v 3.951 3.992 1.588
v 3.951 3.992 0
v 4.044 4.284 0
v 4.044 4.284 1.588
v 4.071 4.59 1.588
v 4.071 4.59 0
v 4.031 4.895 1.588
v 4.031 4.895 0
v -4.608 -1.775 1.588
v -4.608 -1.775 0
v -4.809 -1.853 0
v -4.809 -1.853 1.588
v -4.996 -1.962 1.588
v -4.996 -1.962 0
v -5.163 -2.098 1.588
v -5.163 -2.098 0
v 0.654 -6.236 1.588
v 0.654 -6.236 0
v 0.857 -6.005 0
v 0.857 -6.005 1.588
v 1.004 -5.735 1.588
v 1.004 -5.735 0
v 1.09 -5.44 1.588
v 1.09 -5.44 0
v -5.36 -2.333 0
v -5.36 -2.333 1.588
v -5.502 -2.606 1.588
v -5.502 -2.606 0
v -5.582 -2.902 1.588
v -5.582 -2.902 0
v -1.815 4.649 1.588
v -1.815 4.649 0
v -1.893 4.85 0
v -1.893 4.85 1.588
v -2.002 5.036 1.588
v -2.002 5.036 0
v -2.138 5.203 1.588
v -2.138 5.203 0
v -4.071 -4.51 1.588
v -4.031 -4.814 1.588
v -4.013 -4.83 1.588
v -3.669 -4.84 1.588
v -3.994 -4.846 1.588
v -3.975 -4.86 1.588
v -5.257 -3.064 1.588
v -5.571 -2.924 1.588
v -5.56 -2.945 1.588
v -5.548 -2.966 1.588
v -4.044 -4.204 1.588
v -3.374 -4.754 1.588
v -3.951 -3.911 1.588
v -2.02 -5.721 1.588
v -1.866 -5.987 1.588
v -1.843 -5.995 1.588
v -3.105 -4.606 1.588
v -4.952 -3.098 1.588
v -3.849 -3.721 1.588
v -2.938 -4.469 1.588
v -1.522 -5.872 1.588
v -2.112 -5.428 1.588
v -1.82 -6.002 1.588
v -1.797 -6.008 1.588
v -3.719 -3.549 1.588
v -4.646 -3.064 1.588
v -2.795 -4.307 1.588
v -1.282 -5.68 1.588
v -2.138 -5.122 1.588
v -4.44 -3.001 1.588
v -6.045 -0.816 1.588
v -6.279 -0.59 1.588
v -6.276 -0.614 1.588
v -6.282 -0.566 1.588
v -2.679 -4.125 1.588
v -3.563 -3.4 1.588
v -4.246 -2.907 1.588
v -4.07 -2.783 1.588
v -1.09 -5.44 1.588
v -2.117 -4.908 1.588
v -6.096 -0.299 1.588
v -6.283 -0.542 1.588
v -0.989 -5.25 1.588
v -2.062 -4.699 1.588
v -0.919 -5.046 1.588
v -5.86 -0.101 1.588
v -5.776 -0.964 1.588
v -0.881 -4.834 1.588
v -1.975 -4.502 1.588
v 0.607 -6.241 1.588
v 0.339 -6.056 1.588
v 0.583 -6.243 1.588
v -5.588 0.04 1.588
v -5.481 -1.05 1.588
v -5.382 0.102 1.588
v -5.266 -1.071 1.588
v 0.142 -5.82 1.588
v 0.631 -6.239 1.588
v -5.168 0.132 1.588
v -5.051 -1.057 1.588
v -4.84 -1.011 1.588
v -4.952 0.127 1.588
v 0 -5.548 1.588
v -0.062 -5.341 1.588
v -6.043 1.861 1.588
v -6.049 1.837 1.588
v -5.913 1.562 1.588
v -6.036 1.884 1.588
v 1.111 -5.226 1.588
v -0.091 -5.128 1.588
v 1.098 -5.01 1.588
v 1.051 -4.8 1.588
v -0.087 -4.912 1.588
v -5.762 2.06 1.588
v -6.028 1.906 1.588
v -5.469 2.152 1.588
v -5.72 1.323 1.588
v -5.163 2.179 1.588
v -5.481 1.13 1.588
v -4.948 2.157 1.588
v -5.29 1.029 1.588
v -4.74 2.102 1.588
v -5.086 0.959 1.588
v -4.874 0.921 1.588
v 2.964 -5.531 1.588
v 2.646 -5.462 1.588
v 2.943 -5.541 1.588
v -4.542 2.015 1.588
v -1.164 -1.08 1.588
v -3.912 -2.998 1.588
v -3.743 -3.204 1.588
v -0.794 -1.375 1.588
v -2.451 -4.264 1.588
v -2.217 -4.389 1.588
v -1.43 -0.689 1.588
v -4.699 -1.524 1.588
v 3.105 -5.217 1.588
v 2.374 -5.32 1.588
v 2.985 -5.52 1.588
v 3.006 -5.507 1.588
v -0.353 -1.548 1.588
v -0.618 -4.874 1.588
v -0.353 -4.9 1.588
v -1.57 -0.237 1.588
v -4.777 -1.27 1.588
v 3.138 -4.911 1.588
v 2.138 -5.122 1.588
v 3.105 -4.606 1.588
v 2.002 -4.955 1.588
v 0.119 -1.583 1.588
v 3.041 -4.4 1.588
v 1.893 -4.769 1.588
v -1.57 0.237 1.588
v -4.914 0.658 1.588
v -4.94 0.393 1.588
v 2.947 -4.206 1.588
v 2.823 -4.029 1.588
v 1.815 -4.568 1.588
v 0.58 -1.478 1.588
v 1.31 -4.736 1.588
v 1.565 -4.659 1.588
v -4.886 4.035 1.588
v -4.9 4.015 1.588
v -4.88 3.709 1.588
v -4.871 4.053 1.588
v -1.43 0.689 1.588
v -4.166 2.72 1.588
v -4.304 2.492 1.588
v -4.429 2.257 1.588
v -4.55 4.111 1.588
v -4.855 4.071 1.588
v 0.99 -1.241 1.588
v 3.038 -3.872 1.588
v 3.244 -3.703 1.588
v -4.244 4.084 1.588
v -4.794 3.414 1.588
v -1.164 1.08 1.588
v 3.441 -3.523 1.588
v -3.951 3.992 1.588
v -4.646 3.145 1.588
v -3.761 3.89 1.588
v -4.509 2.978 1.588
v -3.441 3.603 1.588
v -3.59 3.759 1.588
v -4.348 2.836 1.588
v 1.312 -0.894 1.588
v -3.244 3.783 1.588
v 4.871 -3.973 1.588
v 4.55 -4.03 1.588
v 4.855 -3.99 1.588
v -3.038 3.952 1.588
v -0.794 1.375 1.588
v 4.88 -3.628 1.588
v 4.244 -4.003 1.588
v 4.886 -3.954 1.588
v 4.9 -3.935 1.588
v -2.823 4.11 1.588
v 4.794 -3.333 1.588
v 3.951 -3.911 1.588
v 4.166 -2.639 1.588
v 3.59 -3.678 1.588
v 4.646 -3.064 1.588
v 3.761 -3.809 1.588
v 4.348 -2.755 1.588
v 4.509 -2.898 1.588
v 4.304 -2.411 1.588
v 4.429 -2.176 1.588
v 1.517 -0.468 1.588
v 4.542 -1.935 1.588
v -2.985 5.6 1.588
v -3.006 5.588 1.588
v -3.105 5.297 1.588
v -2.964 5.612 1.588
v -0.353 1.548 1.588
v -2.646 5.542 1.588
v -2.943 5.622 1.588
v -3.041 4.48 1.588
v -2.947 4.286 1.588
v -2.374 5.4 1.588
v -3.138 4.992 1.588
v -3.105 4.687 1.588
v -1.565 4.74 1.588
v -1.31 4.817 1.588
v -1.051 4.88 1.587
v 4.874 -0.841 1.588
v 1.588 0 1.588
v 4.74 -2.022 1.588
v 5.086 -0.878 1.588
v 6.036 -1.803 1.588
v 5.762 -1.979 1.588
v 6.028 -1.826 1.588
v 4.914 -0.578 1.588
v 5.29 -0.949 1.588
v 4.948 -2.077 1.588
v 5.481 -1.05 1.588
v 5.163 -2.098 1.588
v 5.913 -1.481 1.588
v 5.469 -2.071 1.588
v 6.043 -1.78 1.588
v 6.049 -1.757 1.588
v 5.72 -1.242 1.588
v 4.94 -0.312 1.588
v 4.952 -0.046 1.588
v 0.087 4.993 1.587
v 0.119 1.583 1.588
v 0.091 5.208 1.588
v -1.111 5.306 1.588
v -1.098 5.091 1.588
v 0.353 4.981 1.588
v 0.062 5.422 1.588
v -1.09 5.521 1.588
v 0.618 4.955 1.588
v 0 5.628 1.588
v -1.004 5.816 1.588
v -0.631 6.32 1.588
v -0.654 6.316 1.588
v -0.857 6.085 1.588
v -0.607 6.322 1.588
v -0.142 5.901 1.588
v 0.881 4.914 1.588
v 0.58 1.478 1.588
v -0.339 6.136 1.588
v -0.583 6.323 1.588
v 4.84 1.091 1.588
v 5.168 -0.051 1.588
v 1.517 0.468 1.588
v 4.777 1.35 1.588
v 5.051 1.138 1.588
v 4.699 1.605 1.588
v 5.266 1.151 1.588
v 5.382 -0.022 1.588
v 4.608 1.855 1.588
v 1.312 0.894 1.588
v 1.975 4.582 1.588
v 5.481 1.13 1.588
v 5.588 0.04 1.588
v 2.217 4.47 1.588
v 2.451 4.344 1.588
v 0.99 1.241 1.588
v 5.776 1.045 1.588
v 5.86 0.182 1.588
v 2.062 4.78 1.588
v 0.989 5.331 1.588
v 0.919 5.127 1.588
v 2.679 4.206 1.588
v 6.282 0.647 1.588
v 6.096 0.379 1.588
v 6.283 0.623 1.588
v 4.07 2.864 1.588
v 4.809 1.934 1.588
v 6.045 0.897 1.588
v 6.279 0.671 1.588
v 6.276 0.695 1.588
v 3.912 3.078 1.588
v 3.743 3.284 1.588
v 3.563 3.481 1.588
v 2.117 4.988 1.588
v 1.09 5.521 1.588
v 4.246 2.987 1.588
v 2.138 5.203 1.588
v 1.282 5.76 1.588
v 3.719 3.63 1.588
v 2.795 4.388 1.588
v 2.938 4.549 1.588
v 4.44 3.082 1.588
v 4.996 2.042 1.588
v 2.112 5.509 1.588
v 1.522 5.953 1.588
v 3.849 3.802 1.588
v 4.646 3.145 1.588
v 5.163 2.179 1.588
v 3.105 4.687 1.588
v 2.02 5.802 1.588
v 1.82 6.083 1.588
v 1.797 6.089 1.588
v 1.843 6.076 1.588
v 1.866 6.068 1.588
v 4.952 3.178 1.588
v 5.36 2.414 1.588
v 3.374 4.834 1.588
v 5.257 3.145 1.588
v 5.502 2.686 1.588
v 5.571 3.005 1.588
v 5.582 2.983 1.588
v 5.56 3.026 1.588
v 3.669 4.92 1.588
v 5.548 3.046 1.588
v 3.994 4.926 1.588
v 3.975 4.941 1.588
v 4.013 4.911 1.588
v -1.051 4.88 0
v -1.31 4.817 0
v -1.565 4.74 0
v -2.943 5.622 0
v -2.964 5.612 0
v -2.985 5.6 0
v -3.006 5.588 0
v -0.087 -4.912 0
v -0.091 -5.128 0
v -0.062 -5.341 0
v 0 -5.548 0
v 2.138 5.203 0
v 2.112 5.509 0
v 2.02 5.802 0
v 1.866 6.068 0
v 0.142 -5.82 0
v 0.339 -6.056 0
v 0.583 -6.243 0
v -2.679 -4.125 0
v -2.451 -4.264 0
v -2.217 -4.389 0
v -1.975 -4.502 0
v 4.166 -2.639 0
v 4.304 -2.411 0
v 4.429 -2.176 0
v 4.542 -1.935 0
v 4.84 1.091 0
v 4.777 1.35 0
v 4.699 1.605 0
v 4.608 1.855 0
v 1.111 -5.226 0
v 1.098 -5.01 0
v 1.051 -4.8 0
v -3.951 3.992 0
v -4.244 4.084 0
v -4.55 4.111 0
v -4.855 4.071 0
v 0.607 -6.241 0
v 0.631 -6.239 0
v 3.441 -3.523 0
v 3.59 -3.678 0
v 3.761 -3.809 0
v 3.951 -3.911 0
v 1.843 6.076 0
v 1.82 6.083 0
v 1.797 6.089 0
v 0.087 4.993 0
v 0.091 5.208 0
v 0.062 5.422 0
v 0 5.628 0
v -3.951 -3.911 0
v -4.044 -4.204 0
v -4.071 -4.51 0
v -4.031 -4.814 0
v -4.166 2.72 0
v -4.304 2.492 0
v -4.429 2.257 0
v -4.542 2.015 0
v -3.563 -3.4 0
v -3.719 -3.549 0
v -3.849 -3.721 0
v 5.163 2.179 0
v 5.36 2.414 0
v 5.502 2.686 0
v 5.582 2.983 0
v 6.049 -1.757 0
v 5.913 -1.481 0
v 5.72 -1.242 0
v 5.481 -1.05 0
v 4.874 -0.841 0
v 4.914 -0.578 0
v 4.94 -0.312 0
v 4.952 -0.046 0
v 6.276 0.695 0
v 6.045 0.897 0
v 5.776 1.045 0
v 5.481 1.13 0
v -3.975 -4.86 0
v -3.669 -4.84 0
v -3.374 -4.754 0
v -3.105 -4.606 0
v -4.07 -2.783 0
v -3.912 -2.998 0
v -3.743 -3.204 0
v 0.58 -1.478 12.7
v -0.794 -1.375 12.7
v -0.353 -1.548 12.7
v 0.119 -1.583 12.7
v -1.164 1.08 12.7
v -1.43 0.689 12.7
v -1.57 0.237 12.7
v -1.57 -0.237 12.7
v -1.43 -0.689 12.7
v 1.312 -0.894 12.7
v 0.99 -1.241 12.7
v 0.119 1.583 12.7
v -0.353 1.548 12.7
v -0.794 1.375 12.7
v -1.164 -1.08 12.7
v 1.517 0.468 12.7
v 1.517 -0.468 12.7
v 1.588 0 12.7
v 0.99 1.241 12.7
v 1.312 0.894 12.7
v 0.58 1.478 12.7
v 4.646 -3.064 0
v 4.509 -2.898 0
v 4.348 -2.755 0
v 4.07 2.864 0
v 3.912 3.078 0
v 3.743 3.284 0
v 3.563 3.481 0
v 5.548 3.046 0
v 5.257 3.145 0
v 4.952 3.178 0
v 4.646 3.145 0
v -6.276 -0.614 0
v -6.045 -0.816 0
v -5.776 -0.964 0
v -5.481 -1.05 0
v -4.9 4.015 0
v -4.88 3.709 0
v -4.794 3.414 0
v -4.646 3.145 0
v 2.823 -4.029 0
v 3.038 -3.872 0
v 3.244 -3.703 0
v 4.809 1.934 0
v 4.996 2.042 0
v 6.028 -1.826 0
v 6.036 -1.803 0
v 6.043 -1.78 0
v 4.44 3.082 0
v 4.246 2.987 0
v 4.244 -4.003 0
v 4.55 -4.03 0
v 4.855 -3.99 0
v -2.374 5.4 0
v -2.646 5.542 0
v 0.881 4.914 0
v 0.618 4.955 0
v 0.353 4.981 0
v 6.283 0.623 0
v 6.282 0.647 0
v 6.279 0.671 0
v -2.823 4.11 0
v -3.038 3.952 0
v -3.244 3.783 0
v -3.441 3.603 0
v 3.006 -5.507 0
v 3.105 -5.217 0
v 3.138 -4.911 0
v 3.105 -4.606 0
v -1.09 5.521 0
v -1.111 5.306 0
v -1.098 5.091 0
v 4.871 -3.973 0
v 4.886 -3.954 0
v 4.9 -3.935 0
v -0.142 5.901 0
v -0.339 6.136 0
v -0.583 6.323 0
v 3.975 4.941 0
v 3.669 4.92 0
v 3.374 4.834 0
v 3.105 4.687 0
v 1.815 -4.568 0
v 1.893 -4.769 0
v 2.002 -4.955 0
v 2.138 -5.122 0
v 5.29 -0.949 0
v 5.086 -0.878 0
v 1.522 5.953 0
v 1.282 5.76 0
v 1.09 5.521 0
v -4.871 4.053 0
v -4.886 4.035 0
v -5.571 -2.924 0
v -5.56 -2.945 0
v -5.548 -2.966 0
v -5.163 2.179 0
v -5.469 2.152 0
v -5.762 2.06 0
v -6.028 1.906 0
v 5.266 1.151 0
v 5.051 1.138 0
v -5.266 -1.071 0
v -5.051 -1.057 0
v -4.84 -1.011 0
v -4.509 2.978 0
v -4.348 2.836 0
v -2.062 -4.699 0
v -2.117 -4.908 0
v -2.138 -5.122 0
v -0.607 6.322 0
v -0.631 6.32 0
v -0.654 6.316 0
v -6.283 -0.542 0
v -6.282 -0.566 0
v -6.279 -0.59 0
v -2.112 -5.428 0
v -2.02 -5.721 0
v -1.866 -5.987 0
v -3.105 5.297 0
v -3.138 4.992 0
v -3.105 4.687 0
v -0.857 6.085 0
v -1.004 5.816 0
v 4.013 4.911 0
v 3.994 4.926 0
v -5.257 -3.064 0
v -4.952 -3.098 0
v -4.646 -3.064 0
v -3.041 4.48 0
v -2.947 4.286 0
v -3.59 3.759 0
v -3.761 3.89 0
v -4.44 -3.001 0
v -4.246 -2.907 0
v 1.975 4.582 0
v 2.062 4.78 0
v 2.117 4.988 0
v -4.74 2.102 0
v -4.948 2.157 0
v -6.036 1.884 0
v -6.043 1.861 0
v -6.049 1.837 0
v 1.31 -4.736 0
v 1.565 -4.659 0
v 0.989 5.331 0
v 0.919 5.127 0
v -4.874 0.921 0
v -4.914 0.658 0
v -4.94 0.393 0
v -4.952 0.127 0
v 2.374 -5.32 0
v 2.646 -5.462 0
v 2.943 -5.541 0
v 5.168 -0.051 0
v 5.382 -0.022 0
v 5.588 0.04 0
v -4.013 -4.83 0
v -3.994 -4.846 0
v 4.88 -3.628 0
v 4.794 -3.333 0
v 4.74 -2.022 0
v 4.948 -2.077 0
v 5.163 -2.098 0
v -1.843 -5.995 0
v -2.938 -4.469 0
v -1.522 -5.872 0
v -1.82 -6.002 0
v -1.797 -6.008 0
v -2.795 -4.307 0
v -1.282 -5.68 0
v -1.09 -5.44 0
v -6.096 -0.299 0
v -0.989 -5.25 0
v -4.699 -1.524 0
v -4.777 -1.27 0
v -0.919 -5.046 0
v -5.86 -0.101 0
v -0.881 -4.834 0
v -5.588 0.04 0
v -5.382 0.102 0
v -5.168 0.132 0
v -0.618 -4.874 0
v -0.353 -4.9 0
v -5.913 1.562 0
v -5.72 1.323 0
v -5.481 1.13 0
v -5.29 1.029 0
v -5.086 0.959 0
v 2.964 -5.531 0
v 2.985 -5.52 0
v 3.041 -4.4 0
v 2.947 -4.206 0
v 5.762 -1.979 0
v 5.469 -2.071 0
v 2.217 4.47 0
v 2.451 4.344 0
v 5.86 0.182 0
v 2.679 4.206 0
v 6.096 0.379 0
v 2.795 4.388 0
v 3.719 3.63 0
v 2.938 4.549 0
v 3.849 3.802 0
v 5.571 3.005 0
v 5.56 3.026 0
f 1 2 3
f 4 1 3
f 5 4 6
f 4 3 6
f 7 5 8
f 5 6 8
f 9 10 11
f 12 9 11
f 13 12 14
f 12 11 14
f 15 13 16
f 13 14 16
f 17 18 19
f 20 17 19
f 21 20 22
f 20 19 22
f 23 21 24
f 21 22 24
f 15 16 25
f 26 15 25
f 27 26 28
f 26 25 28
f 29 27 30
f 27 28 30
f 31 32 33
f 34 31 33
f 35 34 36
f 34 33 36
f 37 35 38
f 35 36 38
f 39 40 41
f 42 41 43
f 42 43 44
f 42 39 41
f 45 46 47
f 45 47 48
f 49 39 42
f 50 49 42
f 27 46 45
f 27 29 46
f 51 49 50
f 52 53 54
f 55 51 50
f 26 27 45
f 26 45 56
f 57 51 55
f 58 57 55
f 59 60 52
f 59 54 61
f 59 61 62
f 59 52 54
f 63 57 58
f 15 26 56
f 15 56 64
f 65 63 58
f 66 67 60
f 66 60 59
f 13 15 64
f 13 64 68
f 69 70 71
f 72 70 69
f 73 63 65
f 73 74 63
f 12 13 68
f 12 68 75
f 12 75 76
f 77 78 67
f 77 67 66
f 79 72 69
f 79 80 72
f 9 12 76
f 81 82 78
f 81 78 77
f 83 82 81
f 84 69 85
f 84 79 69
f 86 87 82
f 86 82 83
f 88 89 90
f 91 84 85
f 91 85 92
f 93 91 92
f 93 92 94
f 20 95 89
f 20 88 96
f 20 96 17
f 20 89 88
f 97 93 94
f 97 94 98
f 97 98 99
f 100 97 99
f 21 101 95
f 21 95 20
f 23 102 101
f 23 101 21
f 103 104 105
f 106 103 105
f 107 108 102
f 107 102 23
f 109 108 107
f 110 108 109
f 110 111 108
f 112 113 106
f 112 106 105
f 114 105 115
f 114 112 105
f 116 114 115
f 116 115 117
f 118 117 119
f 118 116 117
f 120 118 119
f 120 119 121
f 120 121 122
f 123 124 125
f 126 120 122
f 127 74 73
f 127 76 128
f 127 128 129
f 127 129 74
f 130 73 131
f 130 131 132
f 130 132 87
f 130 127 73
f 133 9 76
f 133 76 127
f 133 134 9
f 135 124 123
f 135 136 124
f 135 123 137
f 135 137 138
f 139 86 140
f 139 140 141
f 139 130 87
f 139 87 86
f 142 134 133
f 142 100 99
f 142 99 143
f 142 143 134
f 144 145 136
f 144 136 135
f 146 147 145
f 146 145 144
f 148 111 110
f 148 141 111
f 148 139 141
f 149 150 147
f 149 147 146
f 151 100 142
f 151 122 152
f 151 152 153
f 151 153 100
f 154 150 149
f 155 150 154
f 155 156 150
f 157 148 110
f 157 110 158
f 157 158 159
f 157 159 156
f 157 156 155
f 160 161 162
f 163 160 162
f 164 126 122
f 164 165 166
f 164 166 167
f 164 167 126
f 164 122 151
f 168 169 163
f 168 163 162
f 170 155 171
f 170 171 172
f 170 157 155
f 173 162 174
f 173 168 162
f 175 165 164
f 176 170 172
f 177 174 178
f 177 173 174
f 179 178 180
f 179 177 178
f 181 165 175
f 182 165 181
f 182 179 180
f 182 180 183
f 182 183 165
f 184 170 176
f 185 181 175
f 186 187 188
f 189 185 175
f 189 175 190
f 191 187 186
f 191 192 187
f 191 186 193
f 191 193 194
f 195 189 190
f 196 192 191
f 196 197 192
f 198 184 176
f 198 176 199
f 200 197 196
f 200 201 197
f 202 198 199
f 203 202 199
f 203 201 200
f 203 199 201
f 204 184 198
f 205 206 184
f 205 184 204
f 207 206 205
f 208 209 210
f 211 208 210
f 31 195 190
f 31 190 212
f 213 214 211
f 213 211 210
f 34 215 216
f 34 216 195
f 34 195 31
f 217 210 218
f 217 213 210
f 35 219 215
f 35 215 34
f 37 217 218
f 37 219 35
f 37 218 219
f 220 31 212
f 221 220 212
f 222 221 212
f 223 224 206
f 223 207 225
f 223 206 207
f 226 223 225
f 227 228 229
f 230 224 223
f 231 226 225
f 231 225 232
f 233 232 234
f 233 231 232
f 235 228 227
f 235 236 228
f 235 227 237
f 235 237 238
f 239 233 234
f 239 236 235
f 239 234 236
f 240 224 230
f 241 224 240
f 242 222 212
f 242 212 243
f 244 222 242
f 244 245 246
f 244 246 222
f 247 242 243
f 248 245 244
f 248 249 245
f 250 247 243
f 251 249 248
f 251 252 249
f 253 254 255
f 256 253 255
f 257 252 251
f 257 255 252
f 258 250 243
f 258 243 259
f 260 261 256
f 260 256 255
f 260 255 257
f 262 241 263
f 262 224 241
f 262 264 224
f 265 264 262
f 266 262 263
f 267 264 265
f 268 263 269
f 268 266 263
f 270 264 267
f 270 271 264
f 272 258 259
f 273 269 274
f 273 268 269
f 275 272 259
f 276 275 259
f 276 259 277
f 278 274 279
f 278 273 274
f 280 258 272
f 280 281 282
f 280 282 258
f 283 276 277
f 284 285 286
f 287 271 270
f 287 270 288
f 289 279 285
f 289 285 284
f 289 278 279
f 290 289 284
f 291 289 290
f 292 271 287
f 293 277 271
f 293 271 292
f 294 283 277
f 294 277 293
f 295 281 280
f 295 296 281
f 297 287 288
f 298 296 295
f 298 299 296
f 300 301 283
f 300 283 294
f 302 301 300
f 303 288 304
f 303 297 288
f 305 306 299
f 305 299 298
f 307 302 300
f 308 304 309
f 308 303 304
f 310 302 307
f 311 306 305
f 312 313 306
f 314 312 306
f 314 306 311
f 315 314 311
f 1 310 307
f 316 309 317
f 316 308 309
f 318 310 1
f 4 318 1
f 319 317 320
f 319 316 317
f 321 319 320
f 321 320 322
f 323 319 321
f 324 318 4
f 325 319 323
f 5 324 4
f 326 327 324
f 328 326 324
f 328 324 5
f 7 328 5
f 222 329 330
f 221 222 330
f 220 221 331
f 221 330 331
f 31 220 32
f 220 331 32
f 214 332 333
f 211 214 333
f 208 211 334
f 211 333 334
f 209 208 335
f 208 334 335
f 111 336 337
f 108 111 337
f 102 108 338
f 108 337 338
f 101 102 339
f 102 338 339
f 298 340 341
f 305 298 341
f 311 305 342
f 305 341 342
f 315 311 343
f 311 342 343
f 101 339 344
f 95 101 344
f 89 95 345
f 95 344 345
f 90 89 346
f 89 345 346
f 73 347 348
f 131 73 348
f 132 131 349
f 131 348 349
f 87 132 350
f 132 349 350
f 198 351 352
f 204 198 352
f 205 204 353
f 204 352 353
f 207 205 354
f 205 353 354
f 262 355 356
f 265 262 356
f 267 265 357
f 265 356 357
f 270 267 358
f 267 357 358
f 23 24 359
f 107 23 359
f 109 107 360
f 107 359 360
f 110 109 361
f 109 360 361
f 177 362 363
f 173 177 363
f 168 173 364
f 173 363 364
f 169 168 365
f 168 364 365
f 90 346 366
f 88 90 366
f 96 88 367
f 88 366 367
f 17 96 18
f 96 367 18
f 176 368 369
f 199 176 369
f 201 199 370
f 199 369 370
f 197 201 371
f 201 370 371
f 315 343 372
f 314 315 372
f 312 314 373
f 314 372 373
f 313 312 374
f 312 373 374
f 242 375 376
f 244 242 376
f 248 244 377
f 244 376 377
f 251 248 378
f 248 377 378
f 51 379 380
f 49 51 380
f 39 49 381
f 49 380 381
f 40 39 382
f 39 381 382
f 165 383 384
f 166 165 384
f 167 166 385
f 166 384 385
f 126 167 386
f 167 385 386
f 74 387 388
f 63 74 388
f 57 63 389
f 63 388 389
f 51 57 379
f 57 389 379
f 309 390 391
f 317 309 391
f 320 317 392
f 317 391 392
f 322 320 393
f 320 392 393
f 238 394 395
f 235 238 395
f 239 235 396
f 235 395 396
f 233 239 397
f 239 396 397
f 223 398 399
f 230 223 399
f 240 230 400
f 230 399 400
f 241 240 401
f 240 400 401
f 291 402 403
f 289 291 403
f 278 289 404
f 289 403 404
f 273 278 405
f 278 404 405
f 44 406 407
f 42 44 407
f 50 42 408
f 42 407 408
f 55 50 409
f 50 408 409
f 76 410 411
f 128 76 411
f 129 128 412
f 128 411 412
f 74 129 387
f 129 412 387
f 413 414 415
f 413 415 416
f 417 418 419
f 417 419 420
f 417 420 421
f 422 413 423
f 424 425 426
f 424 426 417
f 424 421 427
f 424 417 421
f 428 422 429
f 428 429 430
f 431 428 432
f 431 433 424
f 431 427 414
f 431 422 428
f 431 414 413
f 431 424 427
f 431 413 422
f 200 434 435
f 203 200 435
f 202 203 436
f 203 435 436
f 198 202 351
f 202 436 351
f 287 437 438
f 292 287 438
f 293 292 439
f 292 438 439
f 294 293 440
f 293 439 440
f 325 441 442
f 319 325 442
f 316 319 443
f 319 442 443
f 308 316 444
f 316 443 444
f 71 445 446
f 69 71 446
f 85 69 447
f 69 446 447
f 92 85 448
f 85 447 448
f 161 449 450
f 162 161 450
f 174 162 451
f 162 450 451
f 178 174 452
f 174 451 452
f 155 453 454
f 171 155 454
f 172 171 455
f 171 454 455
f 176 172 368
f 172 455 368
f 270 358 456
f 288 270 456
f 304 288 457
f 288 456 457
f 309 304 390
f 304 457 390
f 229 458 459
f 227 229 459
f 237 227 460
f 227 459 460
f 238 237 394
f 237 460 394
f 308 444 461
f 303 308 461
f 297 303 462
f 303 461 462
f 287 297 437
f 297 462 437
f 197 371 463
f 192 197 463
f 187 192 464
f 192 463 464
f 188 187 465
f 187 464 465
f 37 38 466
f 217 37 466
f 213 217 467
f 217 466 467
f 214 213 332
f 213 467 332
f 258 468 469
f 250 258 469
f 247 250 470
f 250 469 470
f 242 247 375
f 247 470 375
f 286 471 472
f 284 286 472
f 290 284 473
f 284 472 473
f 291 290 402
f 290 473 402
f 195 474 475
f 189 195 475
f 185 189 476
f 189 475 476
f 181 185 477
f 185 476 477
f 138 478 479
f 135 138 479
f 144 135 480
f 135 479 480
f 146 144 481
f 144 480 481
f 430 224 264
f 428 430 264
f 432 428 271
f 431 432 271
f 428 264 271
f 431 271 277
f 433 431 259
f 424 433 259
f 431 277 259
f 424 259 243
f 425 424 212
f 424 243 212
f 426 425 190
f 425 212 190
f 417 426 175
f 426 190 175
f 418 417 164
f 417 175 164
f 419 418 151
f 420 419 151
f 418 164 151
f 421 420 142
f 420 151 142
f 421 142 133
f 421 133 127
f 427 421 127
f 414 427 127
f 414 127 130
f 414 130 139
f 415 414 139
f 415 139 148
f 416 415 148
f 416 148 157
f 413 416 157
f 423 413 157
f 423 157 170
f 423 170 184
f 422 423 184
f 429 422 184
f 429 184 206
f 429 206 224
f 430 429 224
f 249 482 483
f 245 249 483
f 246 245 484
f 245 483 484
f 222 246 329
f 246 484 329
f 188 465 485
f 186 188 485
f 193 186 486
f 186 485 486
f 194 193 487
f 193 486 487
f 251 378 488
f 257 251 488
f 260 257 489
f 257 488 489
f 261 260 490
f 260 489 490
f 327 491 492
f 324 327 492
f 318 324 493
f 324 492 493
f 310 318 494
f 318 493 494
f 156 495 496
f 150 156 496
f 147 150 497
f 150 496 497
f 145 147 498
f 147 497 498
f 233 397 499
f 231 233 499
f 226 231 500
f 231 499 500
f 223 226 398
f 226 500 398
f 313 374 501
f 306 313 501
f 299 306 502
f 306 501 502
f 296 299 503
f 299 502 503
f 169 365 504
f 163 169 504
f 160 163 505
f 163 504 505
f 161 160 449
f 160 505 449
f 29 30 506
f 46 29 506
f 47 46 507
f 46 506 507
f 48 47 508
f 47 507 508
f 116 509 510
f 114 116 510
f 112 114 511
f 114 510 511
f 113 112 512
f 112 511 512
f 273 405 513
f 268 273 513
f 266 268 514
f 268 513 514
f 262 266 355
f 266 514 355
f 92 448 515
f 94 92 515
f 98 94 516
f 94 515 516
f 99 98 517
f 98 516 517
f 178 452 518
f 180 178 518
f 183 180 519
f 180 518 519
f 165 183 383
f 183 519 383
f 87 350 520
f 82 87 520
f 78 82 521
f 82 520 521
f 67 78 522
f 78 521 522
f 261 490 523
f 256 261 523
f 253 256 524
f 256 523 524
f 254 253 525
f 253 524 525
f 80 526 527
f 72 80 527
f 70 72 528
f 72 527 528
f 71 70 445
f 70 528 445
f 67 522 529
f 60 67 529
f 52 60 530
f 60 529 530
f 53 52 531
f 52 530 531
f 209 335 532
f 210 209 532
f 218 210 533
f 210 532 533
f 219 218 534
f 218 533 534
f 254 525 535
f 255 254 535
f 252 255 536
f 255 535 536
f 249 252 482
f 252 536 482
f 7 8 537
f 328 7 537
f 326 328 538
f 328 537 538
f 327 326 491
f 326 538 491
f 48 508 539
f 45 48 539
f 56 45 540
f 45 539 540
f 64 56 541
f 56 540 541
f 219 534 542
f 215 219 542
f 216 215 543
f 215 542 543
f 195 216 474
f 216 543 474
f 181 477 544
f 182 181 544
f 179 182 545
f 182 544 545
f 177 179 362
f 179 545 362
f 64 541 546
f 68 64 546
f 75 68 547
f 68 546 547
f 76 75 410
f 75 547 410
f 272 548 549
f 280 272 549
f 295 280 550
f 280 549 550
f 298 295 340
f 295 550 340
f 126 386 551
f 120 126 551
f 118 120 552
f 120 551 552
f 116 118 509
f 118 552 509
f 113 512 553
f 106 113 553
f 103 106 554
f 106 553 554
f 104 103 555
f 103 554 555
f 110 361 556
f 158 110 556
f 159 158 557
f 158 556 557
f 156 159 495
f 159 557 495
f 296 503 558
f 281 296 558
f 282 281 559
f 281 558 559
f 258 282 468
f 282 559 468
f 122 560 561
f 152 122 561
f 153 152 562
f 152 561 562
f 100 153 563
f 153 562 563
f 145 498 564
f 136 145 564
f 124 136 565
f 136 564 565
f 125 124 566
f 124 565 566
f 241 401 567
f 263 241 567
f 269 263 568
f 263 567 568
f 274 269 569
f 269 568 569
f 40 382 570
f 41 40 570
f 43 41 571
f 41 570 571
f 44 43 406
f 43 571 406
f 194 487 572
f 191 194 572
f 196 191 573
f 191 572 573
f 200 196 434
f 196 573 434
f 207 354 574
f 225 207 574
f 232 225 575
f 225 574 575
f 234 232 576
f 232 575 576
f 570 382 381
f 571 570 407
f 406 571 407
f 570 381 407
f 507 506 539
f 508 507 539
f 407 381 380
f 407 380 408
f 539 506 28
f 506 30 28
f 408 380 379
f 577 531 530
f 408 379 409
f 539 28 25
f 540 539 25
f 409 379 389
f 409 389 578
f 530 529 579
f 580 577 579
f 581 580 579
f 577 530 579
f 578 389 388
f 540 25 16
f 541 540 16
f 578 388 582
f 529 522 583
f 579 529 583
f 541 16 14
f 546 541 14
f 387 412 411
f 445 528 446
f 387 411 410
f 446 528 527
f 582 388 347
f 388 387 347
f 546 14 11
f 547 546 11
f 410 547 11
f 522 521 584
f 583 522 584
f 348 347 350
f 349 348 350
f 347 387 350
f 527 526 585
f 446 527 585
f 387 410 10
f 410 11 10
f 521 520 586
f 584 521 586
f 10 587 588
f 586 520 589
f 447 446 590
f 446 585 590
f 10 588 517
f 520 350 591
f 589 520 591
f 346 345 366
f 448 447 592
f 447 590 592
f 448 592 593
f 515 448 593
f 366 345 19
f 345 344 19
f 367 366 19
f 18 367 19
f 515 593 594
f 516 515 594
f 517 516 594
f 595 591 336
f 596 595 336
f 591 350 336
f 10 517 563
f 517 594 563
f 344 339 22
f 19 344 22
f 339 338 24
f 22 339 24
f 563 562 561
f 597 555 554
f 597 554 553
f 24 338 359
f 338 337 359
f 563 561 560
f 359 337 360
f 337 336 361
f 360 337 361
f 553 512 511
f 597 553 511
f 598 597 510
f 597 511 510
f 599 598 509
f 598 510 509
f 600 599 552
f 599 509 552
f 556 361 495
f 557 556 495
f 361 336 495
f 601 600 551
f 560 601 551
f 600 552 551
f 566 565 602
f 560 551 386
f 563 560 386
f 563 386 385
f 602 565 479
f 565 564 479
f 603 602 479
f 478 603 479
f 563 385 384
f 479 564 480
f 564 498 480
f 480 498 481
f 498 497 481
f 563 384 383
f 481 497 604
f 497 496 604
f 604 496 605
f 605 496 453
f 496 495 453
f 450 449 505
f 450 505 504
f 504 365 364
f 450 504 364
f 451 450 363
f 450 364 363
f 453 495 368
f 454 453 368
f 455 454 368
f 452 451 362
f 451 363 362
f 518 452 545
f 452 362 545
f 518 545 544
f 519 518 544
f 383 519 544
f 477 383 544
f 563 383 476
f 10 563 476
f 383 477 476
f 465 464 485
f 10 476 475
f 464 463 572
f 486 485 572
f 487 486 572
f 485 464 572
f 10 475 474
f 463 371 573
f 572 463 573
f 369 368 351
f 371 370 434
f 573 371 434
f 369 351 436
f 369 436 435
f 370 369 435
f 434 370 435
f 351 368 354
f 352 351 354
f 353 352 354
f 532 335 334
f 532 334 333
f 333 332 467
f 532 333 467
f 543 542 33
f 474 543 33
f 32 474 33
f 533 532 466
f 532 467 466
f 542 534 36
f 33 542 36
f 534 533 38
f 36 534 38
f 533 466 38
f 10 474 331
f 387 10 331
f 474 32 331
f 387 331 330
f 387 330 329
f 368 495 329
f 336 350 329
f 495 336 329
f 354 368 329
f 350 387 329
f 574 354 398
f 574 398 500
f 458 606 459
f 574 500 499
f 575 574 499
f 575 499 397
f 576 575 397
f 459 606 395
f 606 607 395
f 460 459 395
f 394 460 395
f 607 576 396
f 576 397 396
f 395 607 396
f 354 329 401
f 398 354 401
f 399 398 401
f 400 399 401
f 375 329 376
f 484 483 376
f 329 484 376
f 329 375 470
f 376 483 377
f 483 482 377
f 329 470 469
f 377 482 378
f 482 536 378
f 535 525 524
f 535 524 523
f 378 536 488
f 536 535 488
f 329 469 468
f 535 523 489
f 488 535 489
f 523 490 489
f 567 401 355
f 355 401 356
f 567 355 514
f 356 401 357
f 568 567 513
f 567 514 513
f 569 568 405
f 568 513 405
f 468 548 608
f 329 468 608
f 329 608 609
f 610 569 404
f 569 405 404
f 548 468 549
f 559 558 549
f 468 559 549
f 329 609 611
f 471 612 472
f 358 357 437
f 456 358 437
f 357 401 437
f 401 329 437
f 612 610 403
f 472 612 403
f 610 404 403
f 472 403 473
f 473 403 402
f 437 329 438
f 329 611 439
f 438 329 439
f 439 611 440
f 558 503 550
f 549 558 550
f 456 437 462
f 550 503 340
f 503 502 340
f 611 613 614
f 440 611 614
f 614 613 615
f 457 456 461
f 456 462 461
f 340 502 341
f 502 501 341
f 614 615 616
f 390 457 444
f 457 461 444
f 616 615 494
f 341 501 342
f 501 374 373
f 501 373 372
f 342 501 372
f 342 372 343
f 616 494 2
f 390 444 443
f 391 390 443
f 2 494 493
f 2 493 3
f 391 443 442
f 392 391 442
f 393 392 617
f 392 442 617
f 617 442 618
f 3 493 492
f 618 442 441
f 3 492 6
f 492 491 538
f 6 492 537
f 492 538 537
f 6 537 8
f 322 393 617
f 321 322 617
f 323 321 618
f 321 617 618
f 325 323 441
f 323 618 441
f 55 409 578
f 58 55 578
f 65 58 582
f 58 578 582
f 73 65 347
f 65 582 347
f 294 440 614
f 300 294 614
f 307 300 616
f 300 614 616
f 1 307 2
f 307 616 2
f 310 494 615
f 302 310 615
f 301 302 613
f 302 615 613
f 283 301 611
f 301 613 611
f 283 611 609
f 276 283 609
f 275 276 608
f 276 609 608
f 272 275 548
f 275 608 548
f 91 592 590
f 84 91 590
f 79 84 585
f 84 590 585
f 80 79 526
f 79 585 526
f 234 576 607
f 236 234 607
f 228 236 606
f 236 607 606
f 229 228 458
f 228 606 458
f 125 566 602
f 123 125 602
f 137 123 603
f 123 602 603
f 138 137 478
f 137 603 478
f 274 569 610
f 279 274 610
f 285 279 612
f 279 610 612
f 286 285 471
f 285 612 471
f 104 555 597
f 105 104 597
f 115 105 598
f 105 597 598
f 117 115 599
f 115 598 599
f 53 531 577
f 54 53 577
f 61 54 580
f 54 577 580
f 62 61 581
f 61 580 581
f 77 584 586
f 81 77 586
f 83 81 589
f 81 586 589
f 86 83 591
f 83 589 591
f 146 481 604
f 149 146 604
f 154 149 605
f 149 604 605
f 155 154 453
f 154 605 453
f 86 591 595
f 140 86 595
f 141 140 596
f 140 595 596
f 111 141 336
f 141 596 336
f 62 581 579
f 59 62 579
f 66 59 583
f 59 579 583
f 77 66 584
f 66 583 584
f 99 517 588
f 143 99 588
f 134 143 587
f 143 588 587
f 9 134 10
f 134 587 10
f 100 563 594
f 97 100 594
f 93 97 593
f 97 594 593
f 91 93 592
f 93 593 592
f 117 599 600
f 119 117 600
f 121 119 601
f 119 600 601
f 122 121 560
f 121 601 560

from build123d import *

# Parameters (mm, degrees)
F1_DEPTH = 1.5875
F2_COUNT = 16
F0_R     = 1.5875
F3_DEPTH = 1.5875
F4_DEPTH = 12.7


# Not quite as in the source:
# - a length typed as a fraction of an inch, garbled in the dataset ("3 / 203.2 mm" for 3/8 in), is restored


with BuildPart() as f1:
    # F0 (on Top) → F1 (new body)
    with BuildSketch(Plane.XY):
        with BuildLine():
            ThreePointArc((-1.051103421, 4.8804715195), (-0.4854789746, 4.9694364781), (0.0866333591, 4.9925288117))
            ThreePointArc((0.0866333591, 4.9925288117), (0.0808731678, 5.3155254225), (-7.85e-08, 5.6282865269))
            ThreePointArc((-7.85e-08, 5.6282865269), (-0.2339701384, 6.0238183846), (-0.5826076907, 6.3232166086))
            ThreePointArc((-0.5826076907, 6.3232166086), (-0.6185779348, 6.3208129001), (-0.6543259611, 6.3161529755))
            ThreePointArc((-0.6543259611, 6.3161529755), (-0.9378548446, 5.954491792), (-1.0901647979, 5.5209146738))
            ThreePointArc((-1.0901647979, 5.5209146738), (-1.108467423, 5.1983855986), (-1.051103421, 4.8804715195))
        make_face()
    extrude(amount=F1_DEPTH)


with BuildPart() as f2_1:
    # F2: instance of F1
    add(f1.part.rotate(Axis((-7.85e-08, 0.0402865269, 0), (0, 0, 1)), 1 * 360 / F2_COUNT))


with BuildPart() as f2_2:
    # F2: instance of F1
    add(f1.part.rotate(Axis((-7.85e-08, 0.0402865269, 0), (0, 0, 1)), 2 * 360 / F2_COUNT))


with BuildPart() as f2_3:
    # F2: instance of F1
    add(f1.part.rotate(Axis((-7.85e-08, 0.0402865269, 0), (0, 0, 1)), 3 * 360 / F2_COUNT))


with BuildPart() as f2_4:
    # F2: instance of F1
    add(f1.part.rotate(Axis((-7.85e-08, 0.0402865269, 0), (0, 0, 1)), 4 * 360 / F2_COUNT))


with BuildPart() as f2_5:
    # F2: instance of F1
    add(f1.part.rotate(Axis((-7.85e-08, 0.0402865269, 0), (0, 0, 1)), 5 * 360 / F2_COUNT))


with BuildPart() as f2_6:
    # F2: instance of F1
    add(f1.part.rotate(Axis((-7.85e-08, 0.0402865269, 0), (0, 0, 1)), 6 * 360 / F2_COUNT))


with BuildPart() as f2_7:
    # F2: instance of F1
    add(f1.part.rotate(Axis((-7.85e-08, 0.0402865269, 0), (0, 0, 1)), 7 * 360 / F2_COUNT))


with BuildPart() as f2_8:
    # F2: instance of F1
    add(f1.part.rotate(Axis((-7.85e-08, 0.0402865269, 0), (0, 0, 1)), 8 * 360 / F2_COUNT))


with BuildPart() as f2_9:
    # F2: instance of F1
    add(f1.part.rotate(Axis((-7.85e-08, 0.0402865269, 0), (0, 0, 1)), 9 * 360 / F2_COUNT))


with BuildPart() as f2_10:
    # F2: instance of F1
    add(f1.part.rotate(Axis((-7.85e-08, 0.0402865269, 0), (0, 0, 1)), 10 * 360 / F2_COUNT))


with BuildPart() as f2_11:
    # F2: instance of F1
    add(f1.part.rotate(Axis((-7.85e-08, 0.0402865269, 0), (0, 0, 1)), 11 * 360 / F2_COUNT))


with BuildPart() as f2_12:
    # F2: instance of F1
    add(f1.part.rotate(Axis((-7.85e-08, 0.0402865269, 0), (0, 0, 1)), 12 * 360 / F2_COUNT))


with BuildPart() as f2_13:
    # F2: instance of F1
    add(f1.part.rotate(Axis((-7.85e-08, 0.0402865269, 0), (0, 0, 1)), 13 * 360 / F2_COUNT))


with BuildPart() as f2_14:
    # F2: instance of F1
    add(f1.part.rotate(Axis((-7.85e-08, 0.0402865269, 0), (0, 0, 1)), 14 * 360 / F2_COUNT))


with BuildPart() as f2_15:
    # F2: instance of F1
    add(f1.part.rotate(Axis((-7.85e-08, 0.0402865269, 0), (0, 0, 1)), 15 * 360 / F2_COUNT))


with BuildPart() as f1_1:
    add(f1.part)

    add(f2_1.part)  # F3 merges F2_1

    add(f2_2.part)  # F3 merges F2_2

    add(f2_3.part)  # F3 merges F2_3

    add(f2_4.part)  # F3 merges F2_4

    add(f2_5.part)  # F3 merges F2_5

    add(f2_6.part)  # F3 merges F2_6

    add(f2_7.part)  # F3 merges F2_7

    add(f2_8.part)  # F3 merges F2_8

    add(f2_9.part)  # F3 merges F2_9

    add(f2_10.part)  # F3 merges F2_10

    add(f2_11.part)  # F3 merges F2_11

    add(f2_12.part)  # F3 merges F2_12

    add(f2_13.part)  # F3 merges F2_13

    add(f2_14.part)  # F3 merges F2_14

    add(f2_15.part)  # F3 merges F2_15
    # F0 (on Top) → F3 (join)
    with BuildSketch(Plane.XY):
        with BuildLine():
            ThreePointArc((-1.051103421, 4.8804715195), (-3.1085442832, -3.815768702), (4.9529999215, 0.0402865269))
            ThreePointArc((4.9529999215, 0.0402865269), (3.5327965769, 3.511821748), (0.0866333591, 4.9925288117))
            ThreePointArc((0.0866333591, 4.9925288117), (-0.4854789746, 4.9694364781), (-1.051103421, 4.8804715195))
        make_face()
        Circle(F0_R, mode=Mode.SUBTRACT)
    extrude(amount=F3_DEPTH)

    # F0 (on Top) → F4 (join)
    with BuildSketch(Plane.XY):
        Circle(F0_R)
    extrude(amount=F4_DEPTH)


solid = f1_1.part
